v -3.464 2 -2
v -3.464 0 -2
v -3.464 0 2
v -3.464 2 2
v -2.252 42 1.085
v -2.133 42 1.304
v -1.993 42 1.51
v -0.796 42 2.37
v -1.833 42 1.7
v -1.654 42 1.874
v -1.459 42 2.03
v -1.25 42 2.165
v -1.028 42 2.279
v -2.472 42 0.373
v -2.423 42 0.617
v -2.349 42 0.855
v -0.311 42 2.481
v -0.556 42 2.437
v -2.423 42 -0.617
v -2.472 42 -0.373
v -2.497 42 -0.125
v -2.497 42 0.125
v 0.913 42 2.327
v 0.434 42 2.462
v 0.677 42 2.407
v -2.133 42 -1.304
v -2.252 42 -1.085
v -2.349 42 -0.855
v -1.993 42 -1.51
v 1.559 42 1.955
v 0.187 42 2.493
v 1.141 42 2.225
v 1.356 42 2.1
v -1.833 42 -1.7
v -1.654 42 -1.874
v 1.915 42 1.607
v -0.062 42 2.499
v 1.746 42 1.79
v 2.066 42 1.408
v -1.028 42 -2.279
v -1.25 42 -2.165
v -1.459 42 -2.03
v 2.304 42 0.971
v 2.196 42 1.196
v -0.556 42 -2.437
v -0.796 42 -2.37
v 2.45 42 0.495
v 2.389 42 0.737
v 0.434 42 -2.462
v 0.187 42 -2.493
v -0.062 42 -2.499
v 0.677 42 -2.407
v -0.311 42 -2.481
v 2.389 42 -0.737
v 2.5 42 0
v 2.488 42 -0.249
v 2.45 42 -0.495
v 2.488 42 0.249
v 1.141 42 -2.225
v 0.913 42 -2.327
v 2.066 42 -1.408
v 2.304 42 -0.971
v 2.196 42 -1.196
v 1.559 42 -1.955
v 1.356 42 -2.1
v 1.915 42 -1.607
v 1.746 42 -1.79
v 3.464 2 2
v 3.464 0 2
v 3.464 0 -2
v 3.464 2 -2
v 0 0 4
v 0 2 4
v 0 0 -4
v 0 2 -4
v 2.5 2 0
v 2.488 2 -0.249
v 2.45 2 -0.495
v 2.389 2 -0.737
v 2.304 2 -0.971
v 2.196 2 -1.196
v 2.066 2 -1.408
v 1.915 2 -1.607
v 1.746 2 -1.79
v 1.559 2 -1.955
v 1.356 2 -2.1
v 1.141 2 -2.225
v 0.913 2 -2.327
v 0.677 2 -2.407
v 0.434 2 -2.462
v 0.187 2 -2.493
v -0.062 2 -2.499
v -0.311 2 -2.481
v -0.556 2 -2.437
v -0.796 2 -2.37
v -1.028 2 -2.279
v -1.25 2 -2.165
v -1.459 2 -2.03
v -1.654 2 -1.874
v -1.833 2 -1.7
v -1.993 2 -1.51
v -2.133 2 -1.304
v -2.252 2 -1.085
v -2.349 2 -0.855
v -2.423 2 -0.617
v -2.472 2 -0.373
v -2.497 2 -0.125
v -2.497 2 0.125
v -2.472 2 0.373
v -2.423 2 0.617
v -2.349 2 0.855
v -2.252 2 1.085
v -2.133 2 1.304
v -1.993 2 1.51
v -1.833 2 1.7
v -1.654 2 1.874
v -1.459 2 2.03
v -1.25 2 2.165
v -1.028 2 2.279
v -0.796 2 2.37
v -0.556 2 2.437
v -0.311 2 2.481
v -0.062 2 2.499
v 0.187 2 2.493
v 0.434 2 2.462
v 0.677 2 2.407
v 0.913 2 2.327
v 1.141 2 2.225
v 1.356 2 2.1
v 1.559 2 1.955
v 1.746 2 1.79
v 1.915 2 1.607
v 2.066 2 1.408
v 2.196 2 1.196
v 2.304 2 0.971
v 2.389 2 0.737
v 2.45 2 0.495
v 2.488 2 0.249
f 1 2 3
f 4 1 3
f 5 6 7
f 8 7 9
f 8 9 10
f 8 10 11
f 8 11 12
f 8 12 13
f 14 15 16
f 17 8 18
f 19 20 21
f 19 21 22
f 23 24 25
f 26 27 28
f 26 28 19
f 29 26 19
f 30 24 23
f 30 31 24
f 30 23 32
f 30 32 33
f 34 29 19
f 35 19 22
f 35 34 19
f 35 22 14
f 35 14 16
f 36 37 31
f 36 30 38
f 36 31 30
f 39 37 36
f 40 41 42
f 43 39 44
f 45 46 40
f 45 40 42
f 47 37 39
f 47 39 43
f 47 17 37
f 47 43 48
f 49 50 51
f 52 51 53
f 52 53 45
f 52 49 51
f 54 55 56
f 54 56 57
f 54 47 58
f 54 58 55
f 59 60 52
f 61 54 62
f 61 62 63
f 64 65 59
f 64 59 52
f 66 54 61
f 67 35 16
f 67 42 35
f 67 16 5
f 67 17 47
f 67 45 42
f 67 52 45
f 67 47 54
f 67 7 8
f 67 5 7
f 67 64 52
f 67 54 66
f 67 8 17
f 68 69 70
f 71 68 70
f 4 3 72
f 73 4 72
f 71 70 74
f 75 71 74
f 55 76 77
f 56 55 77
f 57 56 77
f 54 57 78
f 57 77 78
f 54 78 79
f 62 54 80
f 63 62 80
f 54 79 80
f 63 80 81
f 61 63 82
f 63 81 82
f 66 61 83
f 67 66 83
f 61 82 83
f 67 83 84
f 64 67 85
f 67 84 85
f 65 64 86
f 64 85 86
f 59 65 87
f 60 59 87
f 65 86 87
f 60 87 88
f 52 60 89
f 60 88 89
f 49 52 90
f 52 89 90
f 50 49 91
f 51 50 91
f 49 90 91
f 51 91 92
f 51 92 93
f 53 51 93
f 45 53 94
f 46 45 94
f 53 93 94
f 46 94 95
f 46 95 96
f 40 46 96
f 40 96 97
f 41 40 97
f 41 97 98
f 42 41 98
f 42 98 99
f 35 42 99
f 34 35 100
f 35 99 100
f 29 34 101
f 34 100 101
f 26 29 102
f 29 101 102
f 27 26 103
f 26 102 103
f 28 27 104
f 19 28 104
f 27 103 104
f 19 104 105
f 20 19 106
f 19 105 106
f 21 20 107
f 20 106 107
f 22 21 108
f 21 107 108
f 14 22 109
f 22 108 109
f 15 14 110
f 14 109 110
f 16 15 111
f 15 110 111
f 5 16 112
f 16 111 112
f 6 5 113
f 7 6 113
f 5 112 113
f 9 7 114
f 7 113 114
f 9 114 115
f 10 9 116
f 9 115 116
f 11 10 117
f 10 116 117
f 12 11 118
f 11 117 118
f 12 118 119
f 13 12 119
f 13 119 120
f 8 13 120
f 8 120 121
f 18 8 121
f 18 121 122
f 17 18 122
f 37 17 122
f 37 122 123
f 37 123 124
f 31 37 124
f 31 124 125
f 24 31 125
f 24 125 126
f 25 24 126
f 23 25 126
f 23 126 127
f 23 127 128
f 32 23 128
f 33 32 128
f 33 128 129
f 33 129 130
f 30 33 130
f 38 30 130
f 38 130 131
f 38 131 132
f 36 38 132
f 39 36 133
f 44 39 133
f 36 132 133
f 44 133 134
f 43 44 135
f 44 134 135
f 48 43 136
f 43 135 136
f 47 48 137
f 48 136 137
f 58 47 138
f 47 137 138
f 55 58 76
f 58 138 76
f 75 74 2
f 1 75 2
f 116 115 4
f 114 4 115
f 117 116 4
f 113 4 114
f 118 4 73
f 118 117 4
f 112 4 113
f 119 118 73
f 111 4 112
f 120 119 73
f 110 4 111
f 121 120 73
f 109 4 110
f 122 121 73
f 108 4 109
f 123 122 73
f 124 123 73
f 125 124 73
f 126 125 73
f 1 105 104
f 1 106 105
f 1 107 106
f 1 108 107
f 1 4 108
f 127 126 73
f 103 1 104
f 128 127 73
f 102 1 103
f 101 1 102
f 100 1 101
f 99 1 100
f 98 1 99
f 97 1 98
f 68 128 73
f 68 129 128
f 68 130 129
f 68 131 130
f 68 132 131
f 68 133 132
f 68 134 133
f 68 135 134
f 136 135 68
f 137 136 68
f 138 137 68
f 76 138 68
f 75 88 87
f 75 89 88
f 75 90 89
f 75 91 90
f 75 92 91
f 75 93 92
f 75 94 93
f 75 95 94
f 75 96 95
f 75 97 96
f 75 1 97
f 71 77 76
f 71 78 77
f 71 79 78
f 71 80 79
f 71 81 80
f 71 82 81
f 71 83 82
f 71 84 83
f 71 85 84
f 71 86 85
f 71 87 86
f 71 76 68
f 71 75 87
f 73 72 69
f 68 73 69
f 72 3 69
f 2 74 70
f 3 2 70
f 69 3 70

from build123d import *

# Parameters (mm, degrees)
SKETCH1_R           = 4
BOSS_EXTRUDE1_DEPTH = 2
SKETCH2_R           = 2.5
BOSS_EXTRUDE2_DEPTH = 40
SKETCH3_OUTSIDE_W   = 18.7
SKETCH3_OUTSIDE_H   = 18.7
CUT_EXTRUDE1_DEPTH  = 10


with BuildPart() as part:
    # Sketch1 → Boss-Extrude1 (new body)
    with BuildSketch(Plane(origin=(0, 0, 0), x_dir=(1, 0, 0), z_dir=(0, 1, 0))):
        Circle(SKETCH1_R)
    extrude(amount=BOSS_EXTRUDE1_DEPTH)

    # Sketch2 → Boss-Extrude2 (add)
    with BuildSketch(Plane(origin=(0, 2, 0), x_dir=(1, 0, 0), z_dir=(0, 1, 0))):
        Circle(SKETCH2_R)
    extrude(amount=BOSS_EXTRUDE2_DEPTH)

    # Sketch3 outside → Cut-Extrude1 (cut)
    with BuildSketch(Plane(origin=(0, 0, 0), x_dir=(-1, 0, 0), z_dir=(0, -1, 0))):
        Rectangle(SKETCH3_OUTSIDE_W, SKETCH3_OUTSIDE_H)
        Polygon((0, 4), (3.464101615, 2), (3.464101615, -2), (0, -4), (-3.464101615, -2), (-3.464101615, 2), align=None, mode=Mode.SUBTRACT)
    extrude(amount=-CUT_EXTRUDE1_DEPTH, mode=Mode.SUBTRACT)


solid = part.part
